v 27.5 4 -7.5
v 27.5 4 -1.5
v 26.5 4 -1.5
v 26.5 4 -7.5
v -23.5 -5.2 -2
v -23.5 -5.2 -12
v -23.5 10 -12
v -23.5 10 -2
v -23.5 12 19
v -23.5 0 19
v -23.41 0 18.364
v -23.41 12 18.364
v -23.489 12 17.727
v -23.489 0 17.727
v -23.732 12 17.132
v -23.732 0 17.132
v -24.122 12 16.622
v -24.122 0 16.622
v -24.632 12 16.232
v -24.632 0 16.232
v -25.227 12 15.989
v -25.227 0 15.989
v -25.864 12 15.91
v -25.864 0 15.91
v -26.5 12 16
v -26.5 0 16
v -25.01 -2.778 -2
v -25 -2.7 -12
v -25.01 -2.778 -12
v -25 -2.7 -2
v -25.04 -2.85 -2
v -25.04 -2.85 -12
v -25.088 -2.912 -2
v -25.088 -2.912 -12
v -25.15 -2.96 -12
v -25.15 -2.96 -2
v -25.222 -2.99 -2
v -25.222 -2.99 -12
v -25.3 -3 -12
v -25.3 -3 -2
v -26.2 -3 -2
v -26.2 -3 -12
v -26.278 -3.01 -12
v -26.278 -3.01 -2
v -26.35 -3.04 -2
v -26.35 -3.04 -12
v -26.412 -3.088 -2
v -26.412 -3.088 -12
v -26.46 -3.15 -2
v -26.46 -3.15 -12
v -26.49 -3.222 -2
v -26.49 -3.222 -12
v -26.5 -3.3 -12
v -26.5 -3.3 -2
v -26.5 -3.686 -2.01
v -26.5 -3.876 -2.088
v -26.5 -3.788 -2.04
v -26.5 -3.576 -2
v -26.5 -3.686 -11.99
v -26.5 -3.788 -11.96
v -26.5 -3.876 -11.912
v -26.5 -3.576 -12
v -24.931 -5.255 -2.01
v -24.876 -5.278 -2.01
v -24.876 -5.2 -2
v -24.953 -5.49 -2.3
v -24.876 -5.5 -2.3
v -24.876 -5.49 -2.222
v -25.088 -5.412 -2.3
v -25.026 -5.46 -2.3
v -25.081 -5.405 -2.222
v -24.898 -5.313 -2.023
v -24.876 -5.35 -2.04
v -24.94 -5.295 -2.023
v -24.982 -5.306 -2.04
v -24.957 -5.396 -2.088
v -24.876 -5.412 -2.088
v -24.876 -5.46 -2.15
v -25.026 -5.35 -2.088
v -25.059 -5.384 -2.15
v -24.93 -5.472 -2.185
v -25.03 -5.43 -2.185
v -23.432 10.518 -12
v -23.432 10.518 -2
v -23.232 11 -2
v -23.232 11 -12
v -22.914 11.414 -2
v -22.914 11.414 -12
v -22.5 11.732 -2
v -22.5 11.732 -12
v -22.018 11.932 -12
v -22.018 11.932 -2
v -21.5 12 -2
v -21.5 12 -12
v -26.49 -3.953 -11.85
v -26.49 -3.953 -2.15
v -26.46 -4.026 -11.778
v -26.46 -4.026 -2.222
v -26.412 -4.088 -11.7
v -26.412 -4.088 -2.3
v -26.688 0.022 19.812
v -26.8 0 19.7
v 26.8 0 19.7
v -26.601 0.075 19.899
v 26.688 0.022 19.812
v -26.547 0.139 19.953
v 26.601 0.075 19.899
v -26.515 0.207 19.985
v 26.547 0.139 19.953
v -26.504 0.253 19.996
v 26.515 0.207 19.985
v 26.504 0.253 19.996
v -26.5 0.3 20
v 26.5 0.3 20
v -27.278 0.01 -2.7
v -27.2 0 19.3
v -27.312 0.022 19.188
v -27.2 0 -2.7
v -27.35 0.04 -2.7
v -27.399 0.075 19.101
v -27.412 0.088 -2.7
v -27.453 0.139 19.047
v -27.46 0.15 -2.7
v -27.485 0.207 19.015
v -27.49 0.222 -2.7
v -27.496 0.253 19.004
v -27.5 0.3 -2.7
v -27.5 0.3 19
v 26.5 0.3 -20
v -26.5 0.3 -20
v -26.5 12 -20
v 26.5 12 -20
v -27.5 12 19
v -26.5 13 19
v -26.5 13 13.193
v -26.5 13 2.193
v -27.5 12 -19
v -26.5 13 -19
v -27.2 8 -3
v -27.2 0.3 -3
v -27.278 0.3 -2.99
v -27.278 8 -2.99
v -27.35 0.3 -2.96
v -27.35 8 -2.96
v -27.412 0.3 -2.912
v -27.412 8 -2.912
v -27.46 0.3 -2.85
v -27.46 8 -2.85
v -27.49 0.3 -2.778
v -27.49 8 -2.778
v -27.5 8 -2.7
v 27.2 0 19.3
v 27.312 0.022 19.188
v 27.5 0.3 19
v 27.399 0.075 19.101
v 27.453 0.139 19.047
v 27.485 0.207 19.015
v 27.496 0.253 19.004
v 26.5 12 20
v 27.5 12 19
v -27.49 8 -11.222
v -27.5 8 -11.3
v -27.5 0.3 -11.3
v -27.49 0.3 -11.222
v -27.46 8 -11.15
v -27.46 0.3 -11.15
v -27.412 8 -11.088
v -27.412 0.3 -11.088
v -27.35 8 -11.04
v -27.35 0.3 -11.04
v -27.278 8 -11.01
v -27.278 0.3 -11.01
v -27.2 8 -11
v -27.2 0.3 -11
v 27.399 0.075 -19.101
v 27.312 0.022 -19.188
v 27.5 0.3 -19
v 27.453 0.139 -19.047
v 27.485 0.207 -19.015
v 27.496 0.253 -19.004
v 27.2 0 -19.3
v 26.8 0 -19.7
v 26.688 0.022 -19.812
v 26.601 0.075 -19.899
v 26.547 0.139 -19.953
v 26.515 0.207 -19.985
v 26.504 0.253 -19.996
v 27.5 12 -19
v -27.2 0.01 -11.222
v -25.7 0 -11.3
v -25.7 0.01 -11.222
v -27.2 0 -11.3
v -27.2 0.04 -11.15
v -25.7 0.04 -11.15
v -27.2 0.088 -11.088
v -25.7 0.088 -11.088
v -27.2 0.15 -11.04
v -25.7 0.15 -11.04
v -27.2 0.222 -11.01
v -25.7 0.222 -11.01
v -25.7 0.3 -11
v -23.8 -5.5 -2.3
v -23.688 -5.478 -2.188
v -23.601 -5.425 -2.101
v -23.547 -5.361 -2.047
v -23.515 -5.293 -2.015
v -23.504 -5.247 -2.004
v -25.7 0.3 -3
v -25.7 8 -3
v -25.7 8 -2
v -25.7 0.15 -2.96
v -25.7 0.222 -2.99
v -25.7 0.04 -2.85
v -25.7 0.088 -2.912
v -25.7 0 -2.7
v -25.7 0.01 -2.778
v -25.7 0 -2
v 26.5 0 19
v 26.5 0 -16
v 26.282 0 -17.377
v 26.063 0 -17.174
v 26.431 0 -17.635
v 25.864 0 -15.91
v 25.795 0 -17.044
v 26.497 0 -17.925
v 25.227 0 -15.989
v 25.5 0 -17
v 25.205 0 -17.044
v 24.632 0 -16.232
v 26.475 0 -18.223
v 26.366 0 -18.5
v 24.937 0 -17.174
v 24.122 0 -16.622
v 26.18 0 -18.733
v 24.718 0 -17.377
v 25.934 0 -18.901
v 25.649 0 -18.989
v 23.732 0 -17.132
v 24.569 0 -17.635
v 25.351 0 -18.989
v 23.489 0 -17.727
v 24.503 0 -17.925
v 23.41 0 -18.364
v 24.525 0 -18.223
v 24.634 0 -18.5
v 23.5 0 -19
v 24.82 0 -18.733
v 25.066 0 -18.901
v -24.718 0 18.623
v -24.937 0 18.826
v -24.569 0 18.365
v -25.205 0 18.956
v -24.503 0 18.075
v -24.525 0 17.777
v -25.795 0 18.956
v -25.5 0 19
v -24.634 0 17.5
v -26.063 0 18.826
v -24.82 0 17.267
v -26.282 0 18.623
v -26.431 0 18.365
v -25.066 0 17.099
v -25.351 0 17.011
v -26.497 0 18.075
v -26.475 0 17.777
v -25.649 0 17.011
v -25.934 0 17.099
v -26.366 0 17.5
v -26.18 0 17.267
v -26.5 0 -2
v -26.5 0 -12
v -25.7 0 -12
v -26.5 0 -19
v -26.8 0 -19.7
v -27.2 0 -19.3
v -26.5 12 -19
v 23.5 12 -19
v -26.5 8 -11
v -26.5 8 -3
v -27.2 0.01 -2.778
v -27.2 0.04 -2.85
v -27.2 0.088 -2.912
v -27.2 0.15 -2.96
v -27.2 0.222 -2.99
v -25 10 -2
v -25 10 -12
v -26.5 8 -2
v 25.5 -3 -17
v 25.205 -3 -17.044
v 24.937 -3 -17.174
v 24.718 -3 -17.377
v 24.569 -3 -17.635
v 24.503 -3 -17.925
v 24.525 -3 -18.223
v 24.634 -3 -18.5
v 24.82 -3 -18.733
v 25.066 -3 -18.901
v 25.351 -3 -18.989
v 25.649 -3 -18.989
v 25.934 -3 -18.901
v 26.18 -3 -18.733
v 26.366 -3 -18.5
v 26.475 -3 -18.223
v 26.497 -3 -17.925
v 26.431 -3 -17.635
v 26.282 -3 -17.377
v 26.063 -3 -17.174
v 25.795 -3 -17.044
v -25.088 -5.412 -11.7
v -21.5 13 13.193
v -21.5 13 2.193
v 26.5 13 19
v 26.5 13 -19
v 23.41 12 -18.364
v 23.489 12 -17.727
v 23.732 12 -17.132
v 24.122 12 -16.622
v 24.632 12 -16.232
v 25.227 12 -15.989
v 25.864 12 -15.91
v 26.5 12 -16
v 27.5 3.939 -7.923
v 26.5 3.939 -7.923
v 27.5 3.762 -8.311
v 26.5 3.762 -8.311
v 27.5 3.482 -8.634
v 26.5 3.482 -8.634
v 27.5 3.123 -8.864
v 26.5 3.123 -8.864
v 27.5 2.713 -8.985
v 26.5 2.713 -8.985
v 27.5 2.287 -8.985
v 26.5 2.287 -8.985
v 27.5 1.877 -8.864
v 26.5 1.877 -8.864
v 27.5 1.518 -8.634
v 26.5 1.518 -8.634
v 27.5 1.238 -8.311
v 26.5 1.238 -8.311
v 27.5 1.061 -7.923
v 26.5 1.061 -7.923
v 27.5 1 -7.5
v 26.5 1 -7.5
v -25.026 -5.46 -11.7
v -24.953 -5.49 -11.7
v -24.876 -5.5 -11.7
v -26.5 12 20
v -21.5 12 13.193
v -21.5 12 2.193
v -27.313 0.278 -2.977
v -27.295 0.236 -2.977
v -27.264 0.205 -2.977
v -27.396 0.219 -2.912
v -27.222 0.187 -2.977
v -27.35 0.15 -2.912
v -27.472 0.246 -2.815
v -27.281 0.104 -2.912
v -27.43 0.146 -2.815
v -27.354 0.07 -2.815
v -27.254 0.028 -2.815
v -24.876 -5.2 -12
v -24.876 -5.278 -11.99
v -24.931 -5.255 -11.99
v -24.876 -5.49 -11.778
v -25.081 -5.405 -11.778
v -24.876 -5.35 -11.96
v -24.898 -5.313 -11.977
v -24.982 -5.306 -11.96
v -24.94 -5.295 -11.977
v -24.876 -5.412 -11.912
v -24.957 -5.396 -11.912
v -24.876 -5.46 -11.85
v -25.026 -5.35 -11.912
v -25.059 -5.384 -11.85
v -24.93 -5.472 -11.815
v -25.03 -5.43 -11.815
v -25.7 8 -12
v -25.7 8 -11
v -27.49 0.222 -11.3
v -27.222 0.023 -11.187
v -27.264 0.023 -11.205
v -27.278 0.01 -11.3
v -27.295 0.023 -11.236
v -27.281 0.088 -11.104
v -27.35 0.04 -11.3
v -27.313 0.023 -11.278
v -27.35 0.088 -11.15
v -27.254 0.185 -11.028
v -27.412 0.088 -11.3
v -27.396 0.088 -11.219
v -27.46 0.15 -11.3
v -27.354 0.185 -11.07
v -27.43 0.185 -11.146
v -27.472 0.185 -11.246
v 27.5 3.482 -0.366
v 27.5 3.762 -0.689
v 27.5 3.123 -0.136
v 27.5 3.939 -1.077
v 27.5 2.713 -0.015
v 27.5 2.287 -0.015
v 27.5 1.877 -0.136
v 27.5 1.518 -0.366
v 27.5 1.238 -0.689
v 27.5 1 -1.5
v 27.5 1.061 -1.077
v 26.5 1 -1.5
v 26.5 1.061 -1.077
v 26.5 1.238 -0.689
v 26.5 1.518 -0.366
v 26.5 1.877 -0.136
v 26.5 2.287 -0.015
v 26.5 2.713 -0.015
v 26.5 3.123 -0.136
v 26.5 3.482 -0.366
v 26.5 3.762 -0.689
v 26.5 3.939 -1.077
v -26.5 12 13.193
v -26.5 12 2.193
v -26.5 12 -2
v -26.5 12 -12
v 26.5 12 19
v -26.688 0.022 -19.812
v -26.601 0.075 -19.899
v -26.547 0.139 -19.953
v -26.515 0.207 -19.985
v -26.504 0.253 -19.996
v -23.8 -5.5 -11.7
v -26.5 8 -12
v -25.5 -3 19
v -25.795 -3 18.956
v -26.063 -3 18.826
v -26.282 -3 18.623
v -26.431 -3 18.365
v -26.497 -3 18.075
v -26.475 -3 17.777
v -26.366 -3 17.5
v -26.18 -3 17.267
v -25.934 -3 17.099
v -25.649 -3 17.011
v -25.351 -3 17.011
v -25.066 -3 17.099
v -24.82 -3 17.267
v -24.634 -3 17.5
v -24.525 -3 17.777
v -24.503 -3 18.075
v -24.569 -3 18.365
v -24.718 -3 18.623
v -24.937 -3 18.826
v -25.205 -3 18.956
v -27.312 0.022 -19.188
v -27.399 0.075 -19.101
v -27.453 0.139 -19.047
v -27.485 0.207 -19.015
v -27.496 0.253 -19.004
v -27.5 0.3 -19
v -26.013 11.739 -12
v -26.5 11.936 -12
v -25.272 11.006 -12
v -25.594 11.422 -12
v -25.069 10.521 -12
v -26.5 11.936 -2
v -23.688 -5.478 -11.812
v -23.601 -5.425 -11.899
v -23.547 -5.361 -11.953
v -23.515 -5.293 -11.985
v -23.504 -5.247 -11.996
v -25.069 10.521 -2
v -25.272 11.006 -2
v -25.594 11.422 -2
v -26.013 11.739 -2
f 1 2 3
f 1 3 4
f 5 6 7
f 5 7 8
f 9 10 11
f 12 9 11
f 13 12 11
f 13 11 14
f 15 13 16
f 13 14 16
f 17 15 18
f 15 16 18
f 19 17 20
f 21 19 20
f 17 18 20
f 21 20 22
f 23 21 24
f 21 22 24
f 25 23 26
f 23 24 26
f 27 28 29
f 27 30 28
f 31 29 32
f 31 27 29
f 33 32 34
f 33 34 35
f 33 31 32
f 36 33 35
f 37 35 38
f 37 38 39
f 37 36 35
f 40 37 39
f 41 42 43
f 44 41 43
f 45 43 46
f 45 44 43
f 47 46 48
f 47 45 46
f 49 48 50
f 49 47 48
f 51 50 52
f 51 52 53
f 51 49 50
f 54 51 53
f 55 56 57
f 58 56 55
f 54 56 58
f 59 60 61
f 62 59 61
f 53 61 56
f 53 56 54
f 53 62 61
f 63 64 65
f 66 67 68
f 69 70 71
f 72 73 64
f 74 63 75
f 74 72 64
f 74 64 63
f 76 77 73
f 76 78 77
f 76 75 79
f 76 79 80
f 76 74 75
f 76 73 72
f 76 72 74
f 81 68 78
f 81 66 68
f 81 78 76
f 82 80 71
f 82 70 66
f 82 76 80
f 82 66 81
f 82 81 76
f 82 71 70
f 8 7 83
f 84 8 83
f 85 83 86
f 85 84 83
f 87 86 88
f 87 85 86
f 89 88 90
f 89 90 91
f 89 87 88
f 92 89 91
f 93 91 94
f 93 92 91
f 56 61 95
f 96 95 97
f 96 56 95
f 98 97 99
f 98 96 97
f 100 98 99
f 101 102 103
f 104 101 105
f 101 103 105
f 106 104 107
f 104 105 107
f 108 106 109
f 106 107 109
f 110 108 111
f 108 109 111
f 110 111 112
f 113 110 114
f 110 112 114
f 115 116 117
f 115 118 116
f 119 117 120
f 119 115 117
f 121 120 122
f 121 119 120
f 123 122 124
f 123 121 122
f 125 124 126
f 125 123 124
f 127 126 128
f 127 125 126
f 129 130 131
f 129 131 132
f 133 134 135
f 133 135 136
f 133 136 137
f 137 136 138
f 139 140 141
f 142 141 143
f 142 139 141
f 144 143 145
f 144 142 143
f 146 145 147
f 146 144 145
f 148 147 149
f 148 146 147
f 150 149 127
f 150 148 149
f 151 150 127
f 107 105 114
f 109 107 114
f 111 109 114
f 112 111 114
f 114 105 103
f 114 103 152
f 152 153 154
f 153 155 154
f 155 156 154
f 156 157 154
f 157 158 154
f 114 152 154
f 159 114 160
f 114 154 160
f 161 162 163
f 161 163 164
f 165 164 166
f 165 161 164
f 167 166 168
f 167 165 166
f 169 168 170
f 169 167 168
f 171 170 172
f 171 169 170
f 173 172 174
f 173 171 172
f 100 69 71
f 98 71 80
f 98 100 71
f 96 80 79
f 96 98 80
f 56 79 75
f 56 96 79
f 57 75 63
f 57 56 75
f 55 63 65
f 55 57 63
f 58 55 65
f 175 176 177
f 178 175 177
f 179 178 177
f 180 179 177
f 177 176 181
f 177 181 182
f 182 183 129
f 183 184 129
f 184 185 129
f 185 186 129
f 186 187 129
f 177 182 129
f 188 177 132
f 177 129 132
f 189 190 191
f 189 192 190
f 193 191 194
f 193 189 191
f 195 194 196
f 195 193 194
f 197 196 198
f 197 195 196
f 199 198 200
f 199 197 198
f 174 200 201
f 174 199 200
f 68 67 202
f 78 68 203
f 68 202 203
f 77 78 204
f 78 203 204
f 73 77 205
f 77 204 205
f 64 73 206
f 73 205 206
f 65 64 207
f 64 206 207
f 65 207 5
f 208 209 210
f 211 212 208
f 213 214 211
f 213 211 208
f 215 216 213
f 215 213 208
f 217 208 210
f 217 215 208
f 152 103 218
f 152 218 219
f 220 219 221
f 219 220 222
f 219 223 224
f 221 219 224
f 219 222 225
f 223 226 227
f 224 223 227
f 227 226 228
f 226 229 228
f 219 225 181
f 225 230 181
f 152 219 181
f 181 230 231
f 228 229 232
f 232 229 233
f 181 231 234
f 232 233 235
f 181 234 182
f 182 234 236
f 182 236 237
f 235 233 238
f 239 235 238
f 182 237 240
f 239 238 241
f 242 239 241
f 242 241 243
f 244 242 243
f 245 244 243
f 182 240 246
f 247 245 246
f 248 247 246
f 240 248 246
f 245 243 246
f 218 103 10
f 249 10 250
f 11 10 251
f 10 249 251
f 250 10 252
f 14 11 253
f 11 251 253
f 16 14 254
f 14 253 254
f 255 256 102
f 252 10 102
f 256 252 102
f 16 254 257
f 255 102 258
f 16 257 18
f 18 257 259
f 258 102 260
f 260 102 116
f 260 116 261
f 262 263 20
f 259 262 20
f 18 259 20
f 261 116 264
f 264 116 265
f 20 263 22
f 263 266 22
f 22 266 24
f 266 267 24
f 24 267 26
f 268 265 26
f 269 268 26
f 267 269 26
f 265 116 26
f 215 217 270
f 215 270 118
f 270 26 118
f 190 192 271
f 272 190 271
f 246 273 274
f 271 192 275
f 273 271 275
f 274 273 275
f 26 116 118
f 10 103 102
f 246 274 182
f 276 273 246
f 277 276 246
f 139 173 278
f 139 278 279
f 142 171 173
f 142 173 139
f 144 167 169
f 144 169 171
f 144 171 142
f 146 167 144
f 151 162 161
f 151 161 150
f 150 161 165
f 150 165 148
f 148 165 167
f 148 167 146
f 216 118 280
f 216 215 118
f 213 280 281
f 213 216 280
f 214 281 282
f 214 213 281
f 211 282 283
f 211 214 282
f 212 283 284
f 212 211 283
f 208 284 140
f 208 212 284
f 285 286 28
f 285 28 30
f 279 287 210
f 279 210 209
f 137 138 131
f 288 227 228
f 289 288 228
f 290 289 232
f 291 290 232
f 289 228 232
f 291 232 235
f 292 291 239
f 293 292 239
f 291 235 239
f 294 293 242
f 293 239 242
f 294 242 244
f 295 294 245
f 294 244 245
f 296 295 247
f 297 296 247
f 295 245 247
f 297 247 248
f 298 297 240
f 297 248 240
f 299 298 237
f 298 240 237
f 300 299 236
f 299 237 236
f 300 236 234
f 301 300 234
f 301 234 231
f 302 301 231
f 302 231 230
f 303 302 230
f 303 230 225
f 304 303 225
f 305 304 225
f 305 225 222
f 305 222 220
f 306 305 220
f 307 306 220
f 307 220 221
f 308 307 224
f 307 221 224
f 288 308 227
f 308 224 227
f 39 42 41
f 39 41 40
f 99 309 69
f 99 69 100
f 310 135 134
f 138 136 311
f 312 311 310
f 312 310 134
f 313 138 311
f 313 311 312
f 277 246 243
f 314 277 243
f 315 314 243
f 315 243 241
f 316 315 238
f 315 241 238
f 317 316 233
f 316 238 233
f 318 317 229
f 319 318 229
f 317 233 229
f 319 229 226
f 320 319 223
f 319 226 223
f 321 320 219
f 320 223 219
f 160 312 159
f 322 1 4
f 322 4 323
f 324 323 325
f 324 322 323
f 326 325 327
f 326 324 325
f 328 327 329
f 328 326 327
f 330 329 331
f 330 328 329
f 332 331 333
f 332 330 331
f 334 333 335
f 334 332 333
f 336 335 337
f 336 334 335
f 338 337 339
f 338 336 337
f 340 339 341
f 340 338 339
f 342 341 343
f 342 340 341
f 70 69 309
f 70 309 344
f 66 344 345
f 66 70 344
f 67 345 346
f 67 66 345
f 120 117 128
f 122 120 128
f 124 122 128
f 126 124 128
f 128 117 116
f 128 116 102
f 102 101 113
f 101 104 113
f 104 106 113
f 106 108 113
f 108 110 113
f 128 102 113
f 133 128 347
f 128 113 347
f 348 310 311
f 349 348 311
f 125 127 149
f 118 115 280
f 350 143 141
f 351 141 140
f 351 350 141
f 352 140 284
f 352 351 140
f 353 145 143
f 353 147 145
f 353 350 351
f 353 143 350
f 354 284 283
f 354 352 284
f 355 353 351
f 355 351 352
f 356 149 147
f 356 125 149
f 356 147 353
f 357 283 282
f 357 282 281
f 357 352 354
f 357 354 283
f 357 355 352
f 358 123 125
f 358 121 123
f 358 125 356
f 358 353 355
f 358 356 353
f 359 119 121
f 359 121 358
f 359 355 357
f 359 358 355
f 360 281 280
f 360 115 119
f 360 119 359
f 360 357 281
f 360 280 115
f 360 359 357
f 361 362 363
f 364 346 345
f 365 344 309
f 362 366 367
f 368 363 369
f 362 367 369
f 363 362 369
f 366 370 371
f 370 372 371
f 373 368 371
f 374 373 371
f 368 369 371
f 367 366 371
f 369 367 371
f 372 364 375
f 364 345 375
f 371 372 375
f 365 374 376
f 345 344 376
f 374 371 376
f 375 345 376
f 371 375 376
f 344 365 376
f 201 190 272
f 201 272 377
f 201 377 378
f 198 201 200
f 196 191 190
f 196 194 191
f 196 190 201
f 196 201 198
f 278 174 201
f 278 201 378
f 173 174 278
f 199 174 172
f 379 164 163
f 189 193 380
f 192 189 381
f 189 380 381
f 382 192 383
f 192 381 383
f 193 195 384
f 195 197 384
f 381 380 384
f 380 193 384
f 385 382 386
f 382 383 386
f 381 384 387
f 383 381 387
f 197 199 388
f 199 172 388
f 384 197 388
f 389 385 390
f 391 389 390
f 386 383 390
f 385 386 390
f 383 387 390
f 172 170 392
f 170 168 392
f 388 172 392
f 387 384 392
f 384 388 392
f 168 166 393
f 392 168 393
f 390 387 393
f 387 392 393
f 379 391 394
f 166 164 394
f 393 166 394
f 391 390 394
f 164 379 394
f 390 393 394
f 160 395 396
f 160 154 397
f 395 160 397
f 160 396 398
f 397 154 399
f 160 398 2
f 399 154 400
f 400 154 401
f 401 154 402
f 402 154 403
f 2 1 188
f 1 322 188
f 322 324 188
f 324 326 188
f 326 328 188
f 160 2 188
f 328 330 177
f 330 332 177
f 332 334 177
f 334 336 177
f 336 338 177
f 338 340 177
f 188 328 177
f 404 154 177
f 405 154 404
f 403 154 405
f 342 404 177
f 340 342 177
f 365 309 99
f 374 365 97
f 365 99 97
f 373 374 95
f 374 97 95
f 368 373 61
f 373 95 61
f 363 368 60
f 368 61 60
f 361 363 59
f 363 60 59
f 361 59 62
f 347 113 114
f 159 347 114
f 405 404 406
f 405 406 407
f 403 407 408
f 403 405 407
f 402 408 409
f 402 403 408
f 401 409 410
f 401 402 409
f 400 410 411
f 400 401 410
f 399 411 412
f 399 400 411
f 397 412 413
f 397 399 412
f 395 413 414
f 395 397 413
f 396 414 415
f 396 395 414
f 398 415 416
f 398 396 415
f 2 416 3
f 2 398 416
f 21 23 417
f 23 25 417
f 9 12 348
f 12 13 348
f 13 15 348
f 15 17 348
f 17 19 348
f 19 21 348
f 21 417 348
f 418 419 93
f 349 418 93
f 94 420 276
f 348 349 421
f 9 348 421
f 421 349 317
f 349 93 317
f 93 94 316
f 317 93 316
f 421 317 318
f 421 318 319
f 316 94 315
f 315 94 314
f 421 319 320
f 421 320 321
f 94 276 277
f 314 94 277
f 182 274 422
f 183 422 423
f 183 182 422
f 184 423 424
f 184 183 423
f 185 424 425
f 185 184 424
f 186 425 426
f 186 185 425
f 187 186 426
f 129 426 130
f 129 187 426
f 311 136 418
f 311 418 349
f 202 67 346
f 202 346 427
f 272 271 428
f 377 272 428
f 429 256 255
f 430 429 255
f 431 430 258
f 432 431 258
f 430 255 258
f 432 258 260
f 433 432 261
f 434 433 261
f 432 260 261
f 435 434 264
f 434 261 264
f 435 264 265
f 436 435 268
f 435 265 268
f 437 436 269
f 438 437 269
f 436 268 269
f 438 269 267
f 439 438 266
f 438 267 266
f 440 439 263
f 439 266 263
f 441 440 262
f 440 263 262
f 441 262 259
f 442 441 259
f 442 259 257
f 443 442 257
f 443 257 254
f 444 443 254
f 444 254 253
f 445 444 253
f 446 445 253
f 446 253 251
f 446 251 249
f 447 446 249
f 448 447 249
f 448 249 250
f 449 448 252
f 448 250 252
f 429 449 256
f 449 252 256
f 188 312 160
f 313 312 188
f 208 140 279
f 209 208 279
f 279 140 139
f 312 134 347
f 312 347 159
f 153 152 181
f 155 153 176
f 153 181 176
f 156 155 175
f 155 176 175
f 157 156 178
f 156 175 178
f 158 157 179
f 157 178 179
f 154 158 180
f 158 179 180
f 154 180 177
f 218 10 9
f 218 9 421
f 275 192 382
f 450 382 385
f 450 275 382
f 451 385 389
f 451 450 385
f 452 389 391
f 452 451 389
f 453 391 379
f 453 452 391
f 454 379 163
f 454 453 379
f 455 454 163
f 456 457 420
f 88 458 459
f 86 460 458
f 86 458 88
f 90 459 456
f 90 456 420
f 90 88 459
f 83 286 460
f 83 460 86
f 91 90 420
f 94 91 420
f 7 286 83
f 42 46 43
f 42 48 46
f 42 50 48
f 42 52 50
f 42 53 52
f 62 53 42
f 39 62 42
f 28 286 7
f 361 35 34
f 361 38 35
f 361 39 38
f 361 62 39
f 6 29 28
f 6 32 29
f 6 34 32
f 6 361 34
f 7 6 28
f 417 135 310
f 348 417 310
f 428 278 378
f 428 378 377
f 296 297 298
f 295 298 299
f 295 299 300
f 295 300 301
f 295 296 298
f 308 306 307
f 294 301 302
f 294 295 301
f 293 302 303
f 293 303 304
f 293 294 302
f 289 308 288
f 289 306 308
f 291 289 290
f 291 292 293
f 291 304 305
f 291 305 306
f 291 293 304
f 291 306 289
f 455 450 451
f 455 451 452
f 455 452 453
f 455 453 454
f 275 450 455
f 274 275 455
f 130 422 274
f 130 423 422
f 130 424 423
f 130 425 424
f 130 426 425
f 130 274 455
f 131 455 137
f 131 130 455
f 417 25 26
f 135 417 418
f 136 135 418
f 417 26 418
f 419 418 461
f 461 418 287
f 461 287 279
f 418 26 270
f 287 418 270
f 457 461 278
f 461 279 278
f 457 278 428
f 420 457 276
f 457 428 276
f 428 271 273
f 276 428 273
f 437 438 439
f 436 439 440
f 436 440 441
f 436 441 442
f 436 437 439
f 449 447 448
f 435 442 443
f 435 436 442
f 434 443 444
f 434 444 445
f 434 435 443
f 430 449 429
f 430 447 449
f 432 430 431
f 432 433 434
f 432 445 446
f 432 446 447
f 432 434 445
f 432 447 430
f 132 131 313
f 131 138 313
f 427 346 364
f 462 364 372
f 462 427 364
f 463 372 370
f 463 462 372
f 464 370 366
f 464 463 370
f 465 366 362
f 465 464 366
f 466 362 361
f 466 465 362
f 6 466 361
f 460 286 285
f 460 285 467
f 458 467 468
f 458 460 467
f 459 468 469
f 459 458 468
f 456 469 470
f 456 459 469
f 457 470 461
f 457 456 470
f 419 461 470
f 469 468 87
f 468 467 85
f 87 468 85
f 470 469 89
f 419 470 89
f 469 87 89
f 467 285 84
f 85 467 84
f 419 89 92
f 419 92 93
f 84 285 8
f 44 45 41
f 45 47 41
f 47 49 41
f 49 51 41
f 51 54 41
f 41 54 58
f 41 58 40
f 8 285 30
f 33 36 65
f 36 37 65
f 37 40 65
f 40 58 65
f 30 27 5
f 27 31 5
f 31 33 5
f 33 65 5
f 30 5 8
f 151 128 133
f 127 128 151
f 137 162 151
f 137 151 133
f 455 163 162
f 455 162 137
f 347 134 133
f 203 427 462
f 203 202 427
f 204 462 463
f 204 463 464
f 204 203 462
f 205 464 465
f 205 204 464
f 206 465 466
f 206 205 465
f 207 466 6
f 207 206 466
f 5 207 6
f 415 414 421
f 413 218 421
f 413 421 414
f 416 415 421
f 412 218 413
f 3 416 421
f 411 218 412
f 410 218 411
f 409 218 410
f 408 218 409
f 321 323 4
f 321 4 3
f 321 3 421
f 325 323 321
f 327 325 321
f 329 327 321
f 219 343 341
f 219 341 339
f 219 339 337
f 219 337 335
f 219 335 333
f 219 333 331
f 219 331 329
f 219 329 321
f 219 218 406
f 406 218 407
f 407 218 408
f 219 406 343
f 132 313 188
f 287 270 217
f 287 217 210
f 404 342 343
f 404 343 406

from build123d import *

# Parameters (mm, degrees)
SKETCH_1_W          = 55
SKETCH_1_H          = 40
EXTRUDE_1_DEPTH     = 13
SHELL_1_T           = -1
CHAMFER_1_SIZE      = 1
CUT_EXTRUDE_3_DEPTH = 2
EXTRUDE_5_DEPTH     = 12
SKETCH_16_W         = 5
SKETCH_16_H         = 11
CUT_EXTRUDE_4_DEPTH = 1
SKETCH_18_W         = 8
SKETCH_18_H         = 8
CUT_EXTRUDE_5_DEPTH = 10
SKETCH_19_W         = 1
SKETCH_19_H         = 8
EXTRUDE_6_DEPTH     = 1
SKETCH_21_W         = 0.2
SKETCH_21_H         = 1
CUT_EXTRUDE_6_DEPTH = 12
SKETCH_20_W         = 1.5
SKETCH_20_H         = 10
EXTRUDE_8_DEPTH     = 17.5
EXTRUDE_9_DEPTH     = 10
SKETCH_7_R          = 1
EXTRUDE_4_DEPTH     = 3
FILLET_1_R          = 2
FILLET_2_R          = 0.3
FILLET_3_R          = 0.3


with BuildPart() as part:
    # 草图1 → 凸台-拉伸1 (new body)
    with BuildSketch(Plane(origin=(0, 0, 0), x_dir=(1, 0, 0), z_dir=(0, 1, 0))):
        Rectangle(SKETCH_1_W, SKETCH_1_H)
    extrude(amount=EXTRUDE_1_DEPTH)

    # 抽壳1
    shell_1_openings = [part.faces().sort_by_distance(p)[0] for p in [
        (0, 0, 0),
    ]]
    offset(amount=SHELL_1_T, openings=shell_1_openings, kind=Kind.INTERSECTION)

    # 倒角1
    chamfer_1_edges = [part.edges().sort_by_distance(p)[0] for p in [
        (27.5, 13, 0),
        (0, 13, -20),
        (-27.5, 13, 0),
        (0, 13, 20),
        (-27.5, 6.5, -20),
        (27.5, 6.5, -20),
        (27.5, 6.5, 20),
        (-27.5, 6.5, 20),
    ]]
    chamfer(chamfer_1_edges, length=CHAMFER_1_SIZE)

    # 草图4 → 切除-拉伸3 (cut)
    with BuildSketch(Plane(origin=(27.5, 0, 0), x_dir=(0, 0, -1), z_dir=(1, 0, 0))):
        with BuildLine():
            Line((1.5, 4), (7.5, 4))
            ThreePointArc((7.5, 4), (9, 2.5), (7.5, 1))
            Line((7.5, 1), (1.5, 1))
            ThreePointArc((1.5, 1), (0, 2.5), (1.5, 4))
        make_face()
    extrude(amount=-CUT_EXTRUDE_3_DEPTH, mode=Mode.SUBTRACT)

    # 草图12 → 凸台-拉伸5 (add)
    with BuildSketch(Plane.XZ):
        with BuildLine():
            Line((26.5, -19), (23.5, -19))
            ThreePointArc((23.5, -19), (24.12244212, -16.62244212), (26.5, -16))
            Line((26.5, -16), (26.5, -19))
        make_face()
        with BuildLine():
            Line((-26.5, 19), (-23.5, 19))
            ThreePointArc((-23.5, 19), (-24.12244212, 16.62244212), (-26.5, 16))
            Line((-26.5, 16), (-26.5, 19))
        make_face()
    extrude(amount=-EXTRUDE_5_DEPTH)

    # 草图16 → 切除-拉伸4 (cut)
    with BuildSketch(Plane(origin=(0, 13, 0), x_dir=(1, 0, 0), z_dir=(0, 1, 0))):
        with Locations((-24, -7.69336468)):
            Rectangle(SKETCH_16_W, SKETCH_16_H)
    extrude(amount=-CUT_EXTRUDE_4_DEPTH, mode=Mode.SUBTRACT)

    # 草图18 → 切除-拉伸5 (cut)
    with BuildSketch(Plane.ZY.offset(27.5)):
        with Locations((-7, 4)):
            Rectangle(SKETCH_18_W, SKETCH_18_H)
    extrude(amount=-CUT_EXTRUDE_5_DEPTH, mode=Mode.SUBTRACT)

    # 草图19 → 凸台-拉伸6 (add)
    with BuildSketch(Plane(origin=(-26.5, 0, 0), x_dir=(0, 0, -1), z_dir=(1, 0, 0))):
        with Locations((2.5, 4)):
            Rectangle(SKETCH_19_W, SKETCH_19_H)
        with Locations((11.5, 4)):
            Rectangle(SKETCH_19_W, SKETCH_19_H)
    extrude(amount=EXTRUDE_6_DEPTH)

    # 草图21 → 切除-拉伸6 (cut)
    with BuildSketch(Plane.XZ):
        with Locations((-25.6, -11.5)):
            Rectangle(SKETCH_21_W, SKETCH_21_H)
        with Locations((-25.6, -2.5)):
            Rectangle(SKETCH_21_W, SKETCH_21_H)
    extrude(amount=-CUT_EXTRUDE_6_DEPTH, mode=Mode.SUBTRACT)

    # 草图20 → 凸台-拉伸8 (add)
    with BuildSketch(Plane.XZ.offset(-12)):
        with Locations((-24.25, -7)):
            Rectangle(SKETCH_20_W, SKETCH_20_H)
    extrude(amount=EXTRUDE_8_DEPTH)

    # 草图22 → 凸台-拉伸9 (add)
    with BuildSketch(Plane(origin=(0, 0, -12), x_dir=(-1, 0, 0), z_dir=(0, 0, -1))):
        Polygon((25, -5.5), (26.5, -4), (26.5, -3), (25, -3), align=None)
    extrude(amount=-EXTRUDE_9_DEPTH)

    # 草图7 → 凸台-拉伸4 (add)
    with BuildSketch(Plane.XZ):
        with Locations(Location((-25.5, 18, 0), (0, 0, 90))):
            Circle(SKETCH_7_R)
        with Locations(Location((25.5, -18, 0), (0, 0, 90))):
            Circle(SKETCH_7_R)
    extrude(amount=EXTRUDE_4_DEPTH)

    # 圆角1
    # the kernel refuses this fillet: 2 mm, written as the material it adds along each edge
    with BuildSketch(Plane(origin=(-25, 12, -12), x_dir=(-1, 0, 0), z_dir=(0, 0, 1)), Plane(origin=(-23.5, 12, -2), x_dir=(1, 0, 0), z_dir=(0, 0, -1))) as fillet_1_piece_1:
        with BuildLine():
            CenterArc((FILLET_1_R, FILLET_1_R), FILLET_1_R, 180, 90)
            Line((0, FILLET_1_R), (0, 0))
            Line((0, 0), (FILLET_1_R, 0))
        make_face()
    extrude(amount=10)

    # 圆角2
    fillet_2_edges = [part.edges().sort_by_distance(p)[0] for p in [
        (-25, -5.5, -7),
        (-24.25, -5.5, -12),
        (-23.5, -5.5, -7),
        (-24.25, -5.5, -2),
        (-25, -3, -7),
        (-26.5, -3, -7),
        (-26.5, -4, -7),
        (-25.75, -4.75, -12),
        (-25.75, -4.75, -2),
    ]]
    fillet(fillet_2_edges, radius=FILLET_2_R)

    # 圆角3
    fillet_3_edges = [part.edges().sort_by_distance(p)[0] for p in [
        (-27.5, 0, 8),
        (-27.5, 4, -11),
        (-27.5, 4, -3),
        (-26.6, 0, -3),
        (-26.6, 0, -11),
        (-27.5, 0, -15),
        (0, 0, -20),
        (27.5, 0, 0),
        (0, 0, 20),
    ]]
    fillet(fillet_3_edges, radius=FILLET_3_R)


solid = part.part
